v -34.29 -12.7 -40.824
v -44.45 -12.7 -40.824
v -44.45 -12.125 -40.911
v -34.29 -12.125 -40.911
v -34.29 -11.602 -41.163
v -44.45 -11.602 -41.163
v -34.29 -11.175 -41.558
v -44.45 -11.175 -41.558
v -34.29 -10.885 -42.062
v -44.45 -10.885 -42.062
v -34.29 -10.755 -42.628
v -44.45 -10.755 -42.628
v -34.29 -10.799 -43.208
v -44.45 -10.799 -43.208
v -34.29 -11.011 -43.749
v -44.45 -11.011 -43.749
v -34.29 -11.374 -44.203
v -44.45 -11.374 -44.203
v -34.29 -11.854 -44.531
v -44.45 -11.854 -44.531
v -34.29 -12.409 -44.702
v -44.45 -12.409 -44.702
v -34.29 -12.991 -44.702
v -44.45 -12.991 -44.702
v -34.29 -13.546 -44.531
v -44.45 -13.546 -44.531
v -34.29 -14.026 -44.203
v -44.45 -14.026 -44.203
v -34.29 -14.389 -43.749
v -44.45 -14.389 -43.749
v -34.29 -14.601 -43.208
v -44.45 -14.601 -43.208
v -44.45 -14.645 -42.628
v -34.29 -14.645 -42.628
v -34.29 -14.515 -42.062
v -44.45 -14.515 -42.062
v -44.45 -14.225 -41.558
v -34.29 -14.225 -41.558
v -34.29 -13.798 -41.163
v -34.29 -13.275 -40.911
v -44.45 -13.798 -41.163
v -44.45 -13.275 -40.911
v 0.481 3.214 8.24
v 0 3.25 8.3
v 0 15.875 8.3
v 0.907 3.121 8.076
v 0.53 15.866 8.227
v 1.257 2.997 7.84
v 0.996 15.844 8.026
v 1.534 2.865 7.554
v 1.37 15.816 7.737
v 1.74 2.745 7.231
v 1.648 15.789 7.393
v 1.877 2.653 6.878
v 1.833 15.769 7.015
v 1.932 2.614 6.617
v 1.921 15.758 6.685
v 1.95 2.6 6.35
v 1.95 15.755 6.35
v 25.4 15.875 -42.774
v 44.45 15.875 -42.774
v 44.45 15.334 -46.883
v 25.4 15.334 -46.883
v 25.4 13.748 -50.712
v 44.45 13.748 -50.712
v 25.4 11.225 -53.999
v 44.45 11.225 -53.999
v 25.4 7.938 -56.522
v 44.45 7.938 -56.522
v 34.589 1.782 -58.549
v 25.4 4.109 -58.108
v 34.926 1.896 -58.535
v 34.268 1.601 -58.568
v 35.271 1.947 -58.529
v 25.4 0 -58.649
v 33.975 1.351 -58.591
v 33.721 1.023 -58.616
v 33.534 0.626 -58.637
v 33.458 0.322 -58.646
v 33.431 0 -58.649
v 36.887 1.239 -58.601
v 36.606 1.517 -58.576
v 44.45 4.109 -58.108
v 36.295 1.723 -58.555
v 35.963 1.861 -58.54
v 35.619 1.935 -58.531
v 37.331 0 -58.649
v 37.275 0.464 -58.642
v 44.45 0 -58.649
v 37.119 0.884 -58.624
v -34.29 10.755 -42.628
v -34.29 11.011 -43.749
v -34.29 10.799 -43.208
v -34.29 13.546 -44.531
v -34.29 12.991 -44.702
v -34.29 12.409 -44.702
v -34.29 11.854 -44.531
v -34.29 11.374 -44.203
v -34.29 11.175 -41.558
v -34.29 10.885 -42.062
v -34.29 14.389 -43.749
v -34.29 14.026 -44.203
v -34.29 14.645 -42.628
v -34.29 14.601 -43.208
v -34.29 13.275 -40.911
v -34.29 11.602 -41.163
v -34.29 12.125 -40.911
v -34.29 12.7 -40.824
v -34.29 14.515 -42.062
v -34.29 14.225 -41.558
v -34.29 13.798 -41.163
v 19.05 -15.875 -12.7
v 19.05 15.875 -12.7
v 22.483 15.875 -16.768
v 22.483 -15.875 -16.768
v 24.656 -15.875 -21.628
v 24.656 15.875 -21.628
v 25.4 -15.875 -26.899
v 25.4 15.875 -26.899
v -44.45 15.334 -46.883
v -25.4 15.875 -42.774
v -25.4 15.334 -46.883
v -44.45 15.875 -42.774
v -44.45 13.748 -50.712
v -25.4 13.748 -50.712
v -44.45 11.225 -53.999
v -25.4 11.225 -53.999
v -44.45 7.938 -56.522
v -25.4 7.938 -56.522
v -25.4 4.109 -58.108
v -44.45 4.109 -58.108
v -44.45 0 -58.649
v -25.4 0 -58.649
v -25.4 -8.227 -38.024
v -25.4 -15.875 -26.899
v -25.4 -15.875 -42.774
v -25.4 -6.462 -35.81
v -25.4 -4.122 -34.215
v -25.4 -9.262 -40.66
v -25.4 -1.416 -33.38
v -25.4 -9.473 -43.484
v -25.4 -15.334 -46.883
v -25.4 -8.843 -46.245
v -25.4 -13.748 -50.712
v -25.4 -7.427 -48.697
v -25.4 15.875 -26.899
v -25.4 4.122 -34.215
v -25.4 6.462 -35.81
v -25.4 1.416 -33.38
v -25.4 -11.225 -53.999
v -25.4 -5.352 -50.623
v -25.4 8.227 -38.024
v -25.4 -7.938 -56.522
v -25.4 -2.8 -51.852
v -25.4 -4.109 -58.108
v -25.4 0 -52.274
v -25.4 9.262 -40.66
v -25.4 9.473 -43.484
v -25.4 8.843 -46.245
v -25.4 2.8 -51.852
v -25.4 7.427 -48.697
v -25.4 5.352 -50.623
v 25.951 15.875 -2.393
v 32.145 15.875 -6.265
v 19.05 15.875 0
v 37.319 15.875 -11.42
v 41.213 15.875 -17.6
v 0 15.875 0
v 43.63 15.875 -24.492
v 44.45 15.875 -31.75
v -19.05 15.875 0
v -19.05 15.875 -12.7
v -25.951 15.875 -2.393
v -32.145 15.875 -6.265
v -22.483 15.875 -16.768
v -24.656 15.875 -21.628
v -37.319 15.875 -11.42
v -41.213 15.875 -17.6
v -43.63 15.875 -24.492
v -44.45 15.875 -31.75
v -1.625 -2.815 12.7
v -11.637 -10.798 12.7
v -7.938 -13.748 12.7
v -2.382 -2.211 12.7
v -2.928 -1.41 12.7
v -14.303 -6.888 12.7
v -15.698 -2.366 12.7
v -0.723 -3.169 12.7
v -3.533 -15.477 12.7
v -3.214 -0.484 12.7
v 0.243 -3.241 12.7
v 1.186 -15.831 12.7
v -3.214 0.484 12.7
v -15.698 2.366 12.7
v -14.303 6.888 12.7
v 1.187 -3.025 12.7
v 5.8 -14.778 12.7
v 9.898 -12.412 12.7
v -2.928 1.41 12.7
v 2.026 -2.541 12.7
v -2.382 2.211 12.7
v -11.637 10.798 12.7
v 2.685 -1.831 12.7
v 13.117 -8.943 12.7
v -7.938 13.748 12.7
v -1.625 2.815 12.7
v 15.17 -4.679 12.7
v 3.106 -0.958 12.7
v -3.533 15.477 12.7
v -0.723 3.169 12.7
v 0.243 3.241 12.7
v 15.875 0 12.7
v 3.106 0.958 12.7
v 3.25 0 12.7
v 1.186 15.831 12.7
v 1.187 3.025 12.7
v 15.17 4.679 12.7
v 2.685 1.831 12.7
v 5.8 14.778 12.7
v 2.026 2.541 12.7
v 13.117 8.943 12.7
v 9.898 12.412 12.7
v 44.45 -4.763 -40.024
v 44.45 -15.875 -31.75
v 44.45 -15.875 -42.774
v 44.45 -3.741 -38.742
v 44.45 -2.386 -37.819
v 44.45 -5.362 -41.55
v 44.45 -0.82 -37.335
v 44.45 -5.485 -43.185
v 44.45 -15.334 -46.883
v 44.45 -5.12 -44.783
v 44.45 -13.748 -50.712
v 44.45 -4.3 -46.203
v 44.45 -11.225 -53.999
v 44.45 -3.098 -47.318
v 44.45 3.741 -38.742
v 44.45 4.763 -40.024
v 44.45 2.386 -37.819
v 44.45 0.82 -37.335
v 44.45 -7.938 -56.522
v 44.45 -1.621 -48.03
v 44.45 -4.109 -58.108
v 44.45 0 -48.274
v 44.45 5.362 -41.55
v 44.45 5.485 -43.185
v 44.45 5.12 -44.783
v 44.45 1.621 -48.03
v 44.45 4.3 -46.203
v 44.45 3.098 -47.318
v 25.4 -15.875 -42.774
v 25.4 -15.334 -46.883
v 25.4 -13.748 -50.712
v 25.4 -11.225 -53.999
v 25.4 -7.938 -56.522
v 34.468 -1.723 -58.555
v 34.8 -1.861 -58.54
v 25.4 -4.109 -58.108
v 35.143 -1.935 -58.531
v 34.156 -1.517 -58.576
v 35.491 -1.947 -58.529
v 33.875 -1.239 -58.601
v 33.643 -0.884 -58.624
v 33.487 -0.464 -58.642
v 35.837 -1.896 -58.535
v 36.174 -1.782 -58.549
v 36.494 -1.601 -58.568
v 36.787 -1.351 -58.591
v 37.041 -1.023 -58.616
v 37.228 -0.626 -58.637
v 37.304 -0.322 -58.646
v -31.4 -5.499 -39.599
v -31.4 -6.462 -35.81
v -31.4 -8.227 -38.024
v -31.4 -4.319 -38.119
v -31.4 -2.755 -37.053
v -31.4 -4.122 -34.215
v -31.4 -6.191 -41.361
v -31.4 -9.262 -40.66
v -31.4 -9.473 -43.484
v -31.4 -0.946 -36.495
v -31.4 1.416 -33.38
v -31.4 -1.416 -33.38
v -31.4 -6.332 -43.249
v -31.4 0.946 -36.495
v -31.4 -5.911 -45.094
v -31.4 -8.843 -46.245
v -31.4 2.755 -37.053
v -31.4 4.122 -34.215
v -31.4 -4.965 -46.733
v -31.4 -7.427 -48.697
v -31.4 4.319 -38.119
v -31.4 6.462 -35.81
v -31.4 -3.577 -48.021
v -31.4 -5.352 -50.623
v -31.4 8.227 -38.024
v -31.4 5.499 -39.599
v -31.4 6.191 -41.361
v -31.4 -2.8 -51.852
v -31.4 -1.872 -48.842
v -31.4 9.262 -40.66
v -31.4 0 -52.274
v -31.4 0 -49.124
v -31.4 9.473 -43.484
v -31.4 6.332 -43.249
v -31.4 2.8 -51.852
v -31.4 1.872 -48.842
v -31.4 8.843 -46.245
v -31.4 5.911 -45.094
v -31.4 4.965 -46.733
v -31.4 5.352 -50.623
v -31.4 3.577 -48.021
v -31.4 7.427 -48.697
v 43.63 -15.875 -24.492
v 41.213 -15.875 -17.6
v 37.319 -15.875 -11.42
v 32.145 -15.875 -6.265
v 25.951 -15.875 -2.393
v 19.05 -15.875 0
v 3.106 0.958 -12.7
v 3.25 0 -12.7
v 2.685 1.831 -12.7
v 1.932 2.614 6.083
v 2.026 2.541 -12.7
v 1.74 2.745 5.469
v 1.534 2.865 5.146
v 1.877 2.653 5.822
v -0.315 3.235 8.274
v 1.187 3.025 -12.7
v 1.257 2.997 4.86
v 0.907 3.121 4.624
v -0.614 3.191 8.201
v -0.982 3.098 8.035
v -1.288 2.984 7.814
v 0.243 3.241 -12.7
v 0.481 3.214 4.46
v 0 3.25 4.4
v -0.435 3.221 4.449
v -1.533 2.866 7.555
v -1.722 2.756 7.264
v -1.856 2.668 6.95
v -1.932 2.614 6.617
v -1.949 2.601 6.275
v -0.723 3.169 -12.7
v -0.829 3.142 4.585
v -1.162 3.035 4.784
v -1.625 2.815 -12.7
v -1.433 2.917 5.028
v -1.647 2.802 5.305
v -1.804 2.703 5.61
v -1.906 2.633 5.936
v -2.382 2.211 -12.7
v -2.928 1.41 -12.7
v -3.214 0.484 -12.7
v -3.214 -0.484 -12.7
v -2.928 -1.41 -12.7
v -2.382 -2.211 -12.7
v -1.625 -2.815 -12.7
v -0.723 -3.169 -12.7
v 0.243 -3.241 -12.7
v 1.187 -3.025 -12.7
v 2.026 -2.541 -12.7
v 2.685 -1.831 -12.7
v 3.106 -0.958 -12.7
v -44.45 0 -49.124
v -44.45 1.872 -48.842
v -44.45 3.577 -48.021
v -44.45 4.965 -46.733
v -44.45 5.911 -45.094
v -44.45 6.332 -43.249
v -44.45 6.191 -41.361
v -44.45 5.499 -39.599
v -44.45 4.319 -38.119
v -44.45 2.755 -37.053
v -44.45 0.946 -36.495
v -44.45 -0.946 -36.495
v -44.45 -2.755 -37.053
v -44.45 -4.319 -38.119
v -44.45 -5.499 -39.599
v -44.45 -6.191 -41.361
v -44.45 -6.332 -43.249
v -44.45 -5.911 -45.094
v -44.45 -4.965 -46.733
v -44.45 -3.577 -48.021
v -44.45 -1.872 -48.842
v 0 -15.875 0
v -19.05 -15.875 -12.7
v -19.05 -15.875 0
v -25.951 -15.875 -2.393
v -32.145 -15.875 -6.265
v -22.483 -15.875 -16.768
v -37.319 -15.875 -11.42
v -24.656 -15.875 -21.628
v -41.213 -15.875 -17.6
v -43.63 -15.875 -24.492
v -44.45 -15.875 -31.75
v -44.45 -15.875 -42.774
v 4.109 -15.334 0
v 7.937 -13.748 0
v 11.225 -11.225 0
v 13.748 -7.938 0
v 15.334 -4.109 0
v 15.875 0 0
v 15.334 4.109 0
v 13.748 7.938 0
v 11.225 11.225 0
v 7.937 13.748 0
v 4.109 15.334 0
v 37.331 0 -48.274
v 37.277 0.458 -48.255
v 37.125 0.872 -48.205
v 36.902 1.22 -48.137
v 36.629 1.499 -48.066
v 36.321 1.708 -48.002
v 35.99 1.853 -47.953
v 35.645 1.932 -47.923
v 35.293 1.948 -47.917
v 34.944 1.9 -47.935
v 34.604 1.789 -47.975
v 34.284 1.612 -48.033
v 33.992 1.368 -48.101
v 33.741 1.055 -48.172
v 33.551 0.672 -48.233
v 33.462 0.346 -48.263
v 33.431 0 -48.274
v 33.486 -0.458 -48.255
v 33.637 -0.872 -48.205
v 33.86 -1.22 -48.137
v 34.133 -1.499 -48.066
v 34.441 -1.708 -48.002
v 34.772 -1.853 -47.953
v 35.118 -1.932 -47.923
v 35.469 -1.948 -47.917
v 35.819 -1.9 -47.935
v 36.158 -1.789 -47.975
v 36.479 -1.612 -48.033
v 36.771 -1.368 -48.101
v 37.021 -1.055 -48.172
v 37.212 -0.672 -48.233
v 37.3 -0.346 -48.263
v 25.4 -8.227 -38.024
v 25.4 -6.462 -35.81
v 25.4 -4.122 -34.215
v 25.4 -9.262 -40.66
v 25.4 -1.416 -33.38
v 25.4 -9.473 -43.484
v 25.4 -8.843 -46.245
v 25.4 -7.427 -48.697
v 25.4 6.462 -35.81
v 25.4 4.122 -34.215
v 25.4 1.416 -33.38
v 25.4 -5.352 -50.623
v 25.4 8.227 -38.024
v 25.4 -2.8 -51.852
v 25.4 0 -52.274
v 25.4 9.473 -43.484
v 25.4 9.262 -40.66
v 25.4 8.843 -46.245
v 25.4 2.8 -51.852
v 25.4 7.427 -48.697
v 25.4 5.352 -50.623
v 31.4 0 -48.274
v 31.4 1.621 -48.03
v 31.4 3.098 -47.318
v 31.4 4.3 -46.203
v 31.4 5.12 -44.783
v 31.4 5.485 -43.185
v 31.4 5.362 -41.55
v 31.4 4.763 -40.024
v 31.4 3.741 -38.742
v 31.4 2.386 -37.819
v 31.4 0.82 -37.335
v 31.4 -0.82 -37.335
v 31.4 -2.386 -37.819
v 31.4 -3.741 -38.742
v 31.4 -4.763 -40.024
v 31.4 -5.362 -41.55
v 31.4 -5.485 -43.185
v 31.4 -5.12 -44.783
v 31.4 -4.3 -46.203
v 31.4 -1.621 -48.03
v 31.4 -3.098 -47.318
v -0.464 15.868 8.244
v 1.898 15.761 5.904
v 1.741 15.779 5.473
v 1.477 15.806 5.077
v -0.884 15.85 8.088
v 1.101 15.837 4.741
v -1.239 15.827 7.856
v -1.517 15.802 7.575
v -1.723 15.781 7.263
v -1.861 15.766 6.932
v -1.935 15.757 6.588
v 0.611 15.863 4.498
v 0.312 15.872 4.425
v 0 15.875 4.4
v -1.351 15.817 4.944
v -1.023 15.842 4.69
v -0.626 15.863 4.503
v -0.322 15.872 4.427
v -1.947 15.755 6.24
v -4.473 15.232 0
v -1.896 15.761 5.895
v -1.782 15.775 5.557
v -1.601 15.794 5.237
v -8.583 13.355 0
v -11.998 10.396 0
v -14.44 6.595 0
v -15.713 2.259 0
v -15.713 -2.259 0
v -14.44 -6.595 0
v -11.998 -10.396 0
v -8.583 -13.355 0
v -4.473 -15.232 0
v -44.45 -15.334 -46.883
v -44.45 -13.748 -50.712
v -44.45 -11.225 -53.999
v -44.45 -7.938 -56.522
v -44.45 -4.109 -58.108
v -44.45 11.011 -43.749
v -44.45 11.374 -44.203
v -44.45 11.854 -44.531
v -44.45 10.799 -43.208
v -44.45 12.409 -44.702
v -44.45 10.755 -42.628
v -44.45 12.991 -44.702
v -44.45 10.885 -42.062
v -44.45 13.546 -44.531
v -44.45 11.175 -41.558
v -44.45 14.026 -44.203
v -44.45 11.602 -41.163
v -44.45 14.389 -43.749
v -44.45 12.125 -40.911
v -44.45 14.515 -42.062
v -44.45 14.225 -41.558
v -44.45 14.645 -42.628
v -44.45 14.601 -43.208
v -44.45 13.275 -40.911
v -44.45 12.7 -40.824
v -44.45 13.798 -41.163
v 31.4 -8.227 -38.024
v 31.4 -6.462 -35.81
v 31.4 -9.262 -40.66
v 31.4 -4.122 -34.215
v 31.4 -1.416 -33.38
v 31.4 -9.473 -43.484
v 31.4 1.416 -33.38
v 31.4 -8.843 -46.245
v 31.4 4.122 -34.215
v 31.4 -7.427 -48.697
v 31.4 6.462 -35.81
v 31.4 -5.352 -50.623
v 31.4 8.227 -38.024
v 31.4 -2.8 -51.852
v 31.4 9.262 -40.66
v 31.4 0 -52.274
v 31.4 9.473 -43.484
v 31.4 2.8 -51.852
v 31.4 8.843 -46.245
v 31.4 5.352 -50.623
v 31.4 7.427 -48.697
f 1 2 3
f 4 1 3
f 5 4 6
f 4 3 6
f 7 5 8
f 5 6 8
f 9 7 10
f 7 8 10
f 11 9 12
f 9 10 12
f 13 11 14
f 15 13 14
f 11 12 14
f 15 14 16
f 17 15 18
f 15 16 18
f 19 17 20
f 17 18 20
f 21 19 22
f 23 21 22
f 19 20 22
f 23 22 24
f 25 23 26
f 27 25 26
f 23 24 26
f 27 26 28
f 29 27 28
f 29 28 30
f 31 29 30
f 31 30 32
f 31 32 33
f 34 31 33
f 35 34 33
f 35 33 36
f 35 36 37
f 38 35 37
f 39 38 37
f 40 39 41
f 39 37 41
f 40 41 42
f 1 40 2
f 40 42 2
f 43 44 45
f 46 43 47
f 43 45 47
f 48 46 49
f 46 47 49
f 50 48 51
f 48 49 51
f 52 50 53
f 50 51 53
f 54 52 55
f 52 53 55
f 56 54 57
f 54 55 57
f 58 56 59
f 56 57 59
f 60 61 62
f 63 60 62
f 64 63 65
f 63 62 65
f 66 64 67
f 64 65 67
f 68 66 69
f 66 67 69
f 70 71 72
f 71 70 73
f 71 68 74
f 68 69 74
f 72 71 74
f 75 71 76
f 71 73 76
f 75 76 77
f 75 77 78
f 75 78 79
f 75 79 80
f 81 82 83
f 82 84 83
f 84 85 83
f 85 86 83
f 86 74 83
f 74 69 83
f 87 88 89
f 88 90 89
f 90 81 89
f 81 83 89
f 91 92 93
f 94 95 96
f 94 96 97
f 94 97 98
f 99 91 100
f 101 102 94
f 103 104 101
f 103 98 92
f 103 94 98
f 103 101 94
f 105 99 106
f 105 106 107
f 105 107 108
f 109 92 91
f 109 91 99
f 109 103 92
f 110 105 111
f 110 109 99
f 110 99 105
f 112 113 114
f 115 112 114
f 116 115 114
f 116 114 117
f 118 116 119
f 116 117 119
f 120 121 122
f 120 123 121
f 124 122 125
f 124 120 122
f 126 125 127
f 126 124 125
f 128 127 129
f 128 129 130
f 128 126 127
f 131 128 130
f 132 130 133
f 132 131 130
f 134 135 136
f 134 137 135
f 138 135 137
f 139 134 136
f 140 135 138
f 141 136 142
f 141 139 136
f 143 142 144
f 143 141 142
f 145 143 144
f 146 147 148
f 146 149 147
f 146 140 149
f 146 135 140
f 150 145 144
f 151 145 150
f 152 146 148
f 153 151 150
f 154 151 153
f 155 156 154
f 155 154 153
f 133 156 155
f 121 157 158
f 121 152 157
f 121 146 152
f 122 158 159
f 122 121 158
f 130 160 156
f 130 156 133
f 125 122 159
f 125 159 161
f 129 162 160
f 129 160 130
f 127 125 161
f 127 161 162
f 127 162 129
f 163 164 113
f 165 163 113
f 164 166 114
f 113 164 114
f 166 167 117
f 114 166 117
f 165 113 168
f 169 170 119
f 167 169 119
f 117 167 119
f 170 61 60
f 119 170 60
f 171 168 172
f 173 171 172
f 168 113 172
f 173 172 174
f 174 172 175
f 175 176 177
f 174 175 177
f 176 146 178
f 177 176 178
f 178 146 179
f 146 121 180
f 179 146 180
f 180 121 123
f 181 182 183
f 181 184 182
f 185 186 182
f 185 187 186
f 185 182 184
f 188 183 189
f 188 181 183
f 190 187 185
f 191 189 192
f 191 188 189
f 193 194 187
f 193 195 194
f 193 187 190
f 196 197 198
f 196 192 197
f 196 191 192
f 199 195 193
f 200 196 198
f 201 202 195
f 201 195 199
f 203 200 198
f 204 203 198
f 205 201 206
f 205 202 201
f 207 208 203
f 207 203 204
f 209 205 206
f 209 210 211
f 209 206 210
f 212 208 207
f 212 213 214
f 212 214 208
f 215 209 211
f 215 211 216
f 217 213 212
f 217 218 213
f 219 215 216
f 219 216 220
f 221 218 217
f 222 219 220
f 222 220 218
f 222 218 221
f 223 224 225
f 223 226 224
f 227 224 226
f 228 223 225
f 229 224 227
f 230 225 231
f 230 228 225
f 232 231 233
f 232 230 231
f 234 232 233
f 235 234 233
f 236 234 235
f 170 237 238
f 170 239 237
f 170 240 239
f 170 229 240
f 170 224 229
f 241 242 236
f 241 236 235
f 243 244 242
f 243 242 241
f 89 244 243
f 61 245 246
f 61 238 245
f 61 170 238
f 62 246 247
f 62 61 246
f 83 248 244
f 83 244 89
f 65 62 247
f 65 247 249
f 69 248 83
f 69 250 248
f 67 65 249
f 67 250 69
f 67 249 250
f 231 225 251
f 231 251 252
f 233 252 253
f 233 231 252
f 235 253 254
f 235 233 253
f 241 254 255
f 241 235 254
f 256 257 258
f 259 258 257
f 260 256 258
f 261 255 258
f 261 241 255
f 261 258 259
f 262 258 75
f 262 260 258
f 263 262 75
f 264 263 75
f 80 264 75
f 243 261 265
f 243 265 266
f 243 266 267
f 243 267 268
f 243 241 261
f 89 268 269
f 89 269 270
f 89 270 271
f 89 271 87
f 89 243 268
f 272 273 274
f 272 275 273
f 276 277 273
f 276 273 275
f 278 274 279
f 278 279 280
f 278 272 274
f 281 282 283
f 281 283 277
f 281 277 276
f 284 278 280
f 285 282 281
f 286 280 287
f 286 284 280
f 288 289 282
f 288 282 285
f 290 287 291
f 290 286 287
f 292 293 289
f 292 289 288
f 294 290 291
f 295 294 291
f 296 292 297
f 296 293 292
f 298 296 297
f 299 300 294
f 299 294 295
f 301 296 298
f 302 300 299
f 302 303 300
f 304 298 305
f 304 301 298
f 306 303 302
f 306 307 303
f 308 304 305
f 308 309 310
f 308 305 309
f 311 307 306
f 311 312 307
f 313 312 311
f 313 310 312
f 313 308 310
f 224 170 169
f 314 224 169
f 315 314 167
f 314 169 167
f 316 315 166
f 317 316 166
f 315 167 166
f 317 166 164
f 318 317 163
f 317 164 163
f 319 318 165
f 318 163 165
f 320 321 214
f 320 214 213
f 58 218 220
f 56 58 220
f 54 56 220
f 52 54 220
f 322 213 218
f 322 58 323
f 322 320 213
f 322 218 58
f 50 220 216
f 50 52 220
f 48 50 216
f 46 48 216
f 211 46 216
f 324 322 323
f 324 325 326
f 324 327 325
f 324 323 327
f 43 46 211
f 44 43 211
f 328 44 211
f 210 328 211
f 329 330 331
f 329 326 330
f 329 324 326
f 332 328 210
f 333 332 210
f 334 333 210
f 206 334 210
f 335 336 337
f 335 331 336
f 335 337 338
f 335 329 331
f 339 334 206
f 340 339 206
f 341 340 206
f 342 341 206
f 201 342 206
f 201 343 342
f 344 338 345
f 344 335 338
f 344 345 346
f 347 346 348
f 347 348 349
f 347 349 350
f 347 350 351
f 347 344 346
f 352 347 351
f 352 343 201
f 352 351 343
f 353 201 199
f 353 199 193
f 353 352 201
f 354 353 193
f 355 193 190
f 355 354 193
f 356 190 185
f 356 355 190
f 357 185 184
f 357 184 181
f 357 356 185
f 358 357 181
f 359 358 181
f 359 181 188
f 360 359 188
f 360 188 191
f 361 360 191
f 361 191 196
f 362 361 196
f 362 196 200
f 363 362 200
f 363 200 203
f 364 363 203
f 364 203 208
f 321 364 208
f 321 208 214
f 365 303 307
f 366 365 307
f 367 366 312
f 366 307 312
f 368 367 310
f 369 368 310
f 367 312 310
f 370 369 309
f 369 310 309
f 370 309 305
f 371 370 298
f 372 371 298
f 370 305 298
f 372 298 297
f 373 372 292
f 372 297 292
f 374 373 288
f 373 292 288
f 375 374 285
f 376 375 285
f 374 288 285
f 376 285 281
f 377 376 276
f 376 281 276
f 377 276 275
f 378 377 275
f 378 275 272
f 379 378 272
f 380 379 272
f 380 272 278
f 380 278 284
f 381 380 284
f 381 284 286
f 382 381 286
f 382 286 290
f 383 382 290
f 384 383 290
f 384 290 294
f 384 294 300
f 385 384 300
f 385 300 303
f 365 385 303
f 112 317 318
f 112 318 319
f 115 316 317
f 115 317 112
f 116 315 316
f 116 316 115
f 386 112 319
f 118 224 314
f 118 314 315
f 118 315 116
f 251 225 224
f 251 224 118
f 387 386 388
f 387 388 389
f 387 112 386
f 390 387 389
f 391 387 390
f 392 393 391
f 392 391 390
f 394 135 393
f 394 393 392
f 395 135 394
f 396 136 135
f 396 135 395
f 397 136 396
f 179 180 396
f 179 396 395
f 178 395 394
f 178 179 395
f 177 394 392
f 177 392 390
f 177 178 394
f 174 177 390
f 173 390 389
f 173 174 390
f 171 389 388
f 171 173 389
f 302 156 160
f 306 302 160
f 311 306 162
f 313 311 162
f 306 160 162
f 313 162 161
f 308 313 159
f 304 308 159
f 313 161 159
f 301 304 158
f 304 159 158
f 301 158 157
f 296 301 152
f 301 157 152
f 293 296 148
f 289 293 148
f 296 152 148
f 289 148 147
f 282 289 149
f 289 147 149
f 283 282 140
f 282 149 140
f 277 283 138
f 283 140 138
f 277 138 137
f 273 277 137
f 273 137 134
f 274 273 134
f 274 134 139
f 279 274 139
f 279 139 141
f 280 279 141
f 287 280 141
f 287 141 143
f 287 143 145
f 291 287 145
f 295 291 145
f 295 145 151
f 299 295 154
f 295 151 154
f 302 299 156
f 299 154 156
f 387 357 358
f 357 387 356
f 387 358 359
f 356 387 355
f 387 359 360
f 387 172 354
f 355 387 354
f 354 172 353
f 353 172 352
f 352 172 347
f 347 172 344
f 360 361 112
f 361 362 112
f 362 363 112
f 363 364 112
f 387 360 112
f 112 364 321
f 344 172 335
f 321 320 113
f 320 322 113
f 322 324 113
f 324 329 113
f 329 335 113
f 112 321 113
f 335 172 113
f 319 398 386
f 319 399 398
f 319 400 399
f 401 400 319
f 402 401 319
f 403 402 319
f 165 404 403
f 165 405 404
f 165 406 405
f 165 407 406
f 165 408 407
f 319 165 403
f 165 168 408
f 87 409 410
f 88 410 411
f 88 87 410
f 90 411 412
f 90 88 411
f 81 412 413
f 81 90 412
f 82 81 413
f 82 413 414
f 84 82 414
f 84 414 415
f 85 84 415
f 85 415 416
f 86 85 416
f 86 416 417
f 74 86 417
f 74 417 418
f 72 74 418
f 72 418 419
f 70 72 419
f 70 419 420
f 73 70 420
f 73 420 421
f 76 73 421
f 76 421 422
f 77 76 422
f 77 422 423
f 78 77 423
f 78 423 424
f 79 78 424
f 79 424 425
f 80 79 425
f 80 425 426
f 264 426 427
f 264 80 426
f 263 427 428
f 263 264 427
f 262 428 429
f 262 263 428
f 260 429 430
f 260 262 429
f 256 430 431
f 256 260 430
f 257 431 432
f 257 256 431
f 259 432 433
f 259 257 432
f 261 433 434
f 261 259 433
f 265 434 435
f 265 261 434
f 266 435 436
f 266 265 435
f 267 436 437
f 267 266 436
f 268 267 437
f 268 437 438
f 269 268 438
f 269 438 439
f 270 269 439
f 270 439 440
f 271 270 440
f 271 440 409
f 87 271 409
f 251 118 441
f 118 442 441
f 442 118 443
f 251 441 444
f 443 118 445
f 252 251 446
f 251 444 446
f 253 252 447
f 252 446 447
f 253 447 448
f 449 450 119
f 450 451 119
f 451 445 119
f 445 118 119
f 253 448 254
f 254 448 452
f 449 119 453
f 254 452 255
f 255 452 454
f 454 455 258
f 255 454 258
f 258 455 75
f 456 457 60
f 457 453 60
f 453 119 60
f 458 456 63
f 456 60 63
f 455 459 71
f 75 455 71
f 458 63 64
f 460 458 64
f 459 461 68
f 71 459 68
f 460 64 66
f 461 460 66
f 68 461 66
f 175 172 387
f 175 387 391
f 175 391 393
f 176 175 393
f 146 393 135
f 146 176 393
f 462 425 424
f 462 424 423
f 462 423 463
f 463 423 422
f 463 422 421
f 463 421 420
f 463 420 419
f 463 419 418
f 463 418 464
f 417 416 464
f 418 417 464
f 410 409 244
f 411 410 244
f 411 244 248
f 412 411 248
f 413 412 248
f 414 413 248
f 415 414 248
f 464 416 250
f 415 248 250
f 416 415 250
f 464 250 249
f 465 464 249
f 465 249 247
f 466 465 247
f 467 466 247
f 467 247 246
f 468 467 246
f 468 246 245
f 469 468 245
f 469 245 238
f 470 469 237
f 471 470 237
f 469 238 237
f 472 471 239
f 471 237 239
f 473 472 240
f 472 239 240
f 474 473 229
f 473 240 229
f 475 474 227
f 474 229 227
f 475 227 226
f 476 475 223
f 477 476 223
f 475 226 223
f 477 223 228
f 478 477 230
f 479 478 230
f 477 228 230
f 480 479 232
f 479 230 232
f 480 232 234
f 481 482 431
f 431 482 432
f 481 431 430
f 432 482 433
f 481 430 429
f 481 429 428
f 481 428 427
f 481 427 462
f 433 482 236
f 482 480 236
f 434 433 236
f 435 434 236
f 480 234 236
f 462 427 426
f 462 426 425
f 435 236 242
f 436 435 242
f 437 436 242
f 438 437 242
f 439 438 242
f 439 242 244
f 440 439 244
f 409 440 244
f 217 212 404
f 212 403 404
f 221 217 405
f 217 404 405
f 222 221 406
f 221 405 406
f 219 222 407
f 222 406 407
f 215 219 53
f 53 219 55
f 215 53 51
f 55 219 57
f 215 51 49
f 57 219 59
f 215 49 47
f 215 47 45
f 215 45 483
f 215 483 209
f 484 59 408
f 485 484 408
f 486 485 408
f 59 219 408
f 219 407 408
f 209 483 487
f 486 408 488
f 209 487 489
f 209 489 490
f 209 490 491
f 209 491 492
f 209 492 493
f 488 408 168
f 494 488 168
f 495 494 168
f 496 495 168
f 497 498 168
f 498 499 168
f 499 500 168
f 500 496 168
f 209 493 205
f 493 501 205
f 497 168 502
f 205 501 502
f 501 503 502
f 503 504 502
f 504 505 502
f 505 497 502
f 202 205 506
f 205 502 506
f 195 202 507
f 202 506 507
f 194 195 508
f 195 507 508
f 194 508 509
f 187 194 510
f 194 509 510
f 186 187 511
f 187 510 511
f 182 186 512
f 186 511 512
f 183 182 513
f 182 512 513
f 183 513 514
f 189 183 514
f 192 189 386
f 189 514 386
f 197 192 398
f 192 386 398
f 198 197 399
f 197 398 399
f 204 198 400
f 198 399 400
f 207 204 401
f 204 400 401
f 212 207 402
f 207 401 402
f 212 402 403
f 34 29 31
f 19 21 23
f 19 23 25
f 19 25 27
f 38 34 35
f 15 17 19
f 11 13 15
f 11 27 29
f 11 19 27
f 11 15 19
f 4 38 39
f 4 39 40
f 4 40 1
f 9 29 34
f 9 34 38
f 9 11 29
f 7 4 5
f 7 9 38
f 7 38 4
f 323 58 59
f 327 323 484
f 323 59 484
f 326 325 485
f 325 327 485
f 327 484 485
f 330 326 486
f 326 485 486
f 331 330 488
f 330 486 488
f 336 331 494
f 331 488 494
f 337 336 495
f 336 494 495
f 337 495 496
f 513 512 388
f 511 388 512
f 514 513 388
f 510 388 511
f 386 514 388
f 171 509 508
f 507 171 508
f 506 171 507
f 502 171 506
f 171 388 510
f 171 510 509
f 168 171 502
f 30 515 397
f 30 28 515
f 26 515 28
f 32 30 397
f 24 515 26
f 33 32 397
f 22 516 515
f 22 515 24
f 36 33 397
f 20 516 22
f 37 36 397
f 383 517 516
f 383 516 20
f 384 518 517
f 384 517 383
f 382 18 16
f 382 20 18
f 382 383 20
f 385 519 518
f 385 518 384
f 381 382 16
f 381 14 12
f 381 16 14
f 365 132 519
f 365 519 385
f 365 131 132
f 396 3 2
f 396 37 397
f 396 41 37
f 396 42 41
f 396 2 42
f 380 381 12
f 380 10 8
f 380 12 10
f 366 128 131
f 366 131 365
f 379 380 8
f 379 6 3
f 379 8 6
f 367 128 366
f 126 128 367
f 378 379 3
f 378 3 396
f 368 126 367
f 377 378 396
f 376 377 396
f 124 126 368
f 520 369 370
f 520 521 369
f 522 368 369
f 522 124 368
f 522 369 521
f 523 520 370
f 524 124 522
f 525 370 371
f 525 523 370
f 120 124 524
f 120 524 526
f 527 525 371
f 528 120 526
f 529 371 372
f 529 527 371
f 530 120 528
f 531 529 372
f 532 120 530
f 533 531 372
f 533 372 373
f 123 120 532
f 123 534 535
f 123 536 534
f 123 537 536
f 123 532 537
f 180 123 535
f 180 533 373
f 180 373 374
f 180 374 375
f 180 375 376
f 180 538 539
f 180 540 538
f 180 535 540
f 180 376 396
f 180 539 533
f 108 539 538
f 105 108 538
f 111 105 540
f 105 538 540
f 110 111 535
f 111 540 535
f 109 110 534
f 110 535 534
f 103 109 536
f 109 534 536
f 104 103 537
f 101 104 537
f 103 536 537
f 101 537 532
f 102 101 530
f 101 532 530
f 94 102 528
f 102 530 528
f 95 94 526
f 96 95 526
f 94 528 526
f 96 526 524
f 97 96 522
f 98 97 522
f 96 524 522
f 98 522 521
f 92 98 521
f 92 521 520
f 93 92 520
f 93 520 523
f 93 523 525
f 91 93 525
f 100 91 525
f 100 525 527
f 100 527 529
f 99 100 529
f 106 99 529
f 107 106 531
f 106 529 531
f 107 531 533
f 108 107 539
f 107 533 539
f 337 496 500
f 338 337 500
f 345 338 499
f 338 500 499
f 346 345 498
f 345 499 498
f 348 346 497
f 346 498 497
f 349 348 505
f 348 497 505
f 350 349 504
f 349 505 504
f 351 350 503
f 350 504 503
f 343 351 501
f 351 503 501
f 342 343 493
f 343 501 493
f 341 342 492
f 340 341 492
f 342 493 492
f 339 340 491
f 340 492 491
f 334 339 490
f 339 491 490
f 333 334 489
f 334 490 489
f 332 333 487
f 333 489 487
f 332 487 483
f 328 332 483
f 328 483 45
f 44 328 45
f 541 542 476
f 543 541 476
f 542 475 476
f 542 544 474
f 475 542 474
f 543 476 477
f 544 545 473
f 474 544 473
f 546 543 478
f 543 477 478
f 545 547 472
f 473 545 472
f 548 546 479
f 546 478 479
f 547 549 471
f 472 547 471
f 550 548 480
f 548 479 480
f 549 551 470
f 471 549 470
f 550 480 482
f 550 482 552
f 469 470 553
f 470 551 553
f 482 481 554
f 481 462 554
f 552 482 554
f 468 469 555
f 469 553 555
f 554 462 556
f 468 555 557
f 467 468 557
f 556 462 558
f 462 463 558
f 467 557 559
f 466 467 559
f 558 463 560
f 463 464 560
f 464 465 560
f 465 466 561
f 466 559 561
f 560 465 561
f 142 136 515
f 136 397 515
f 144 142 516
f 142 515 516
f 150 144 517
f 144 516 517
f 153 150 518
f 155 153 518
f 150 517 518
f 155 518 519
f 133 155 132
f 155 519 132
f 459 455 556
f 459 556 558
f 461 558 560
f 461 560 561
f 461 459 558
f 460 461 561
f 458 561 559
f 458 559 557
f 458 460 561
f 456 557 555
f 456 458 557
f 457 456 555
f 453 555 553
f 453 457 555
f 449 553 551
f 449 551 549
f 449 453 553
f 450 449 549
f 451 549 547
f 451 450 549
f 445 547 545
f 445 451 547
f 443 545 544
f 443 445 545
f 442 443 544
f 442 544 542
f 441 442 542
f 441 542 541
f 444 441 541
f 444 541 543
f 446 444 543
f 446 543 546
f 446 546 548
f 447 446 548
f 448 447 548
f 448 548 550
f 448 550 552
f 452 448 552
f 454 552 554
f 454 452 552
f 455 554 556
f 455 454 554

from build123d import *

# Parameters (mm, degrees)
SKETCH1_R               = 15.875
SKETCH1_R_2             = 3.25
BOSS_EXTRUDE1_DEPTH     = 12.7
BOSS_EXTRUDE2_START     = -12.7
SKETCH1_3_W             = 38.1
SKETCH1_3_H             = 31.75
SKETCH1_3_R             = 3.25
BOSS_EXTRUDE2_DEPTH     = 12.7
CUT_EXTRUDE1_REACH      = 41.144
CUT_EXTRUDE1_END_RADIUS = 3.25
BOSS_EXTRUDE3_DEPTH     = 31.75
FILLET1_R               = 15.875
SKETCH8_R               = 6.35
CUT_EXTRUDE3_DEPTH      = 76.282979766
SKETCH8_3_R             = 9.5
SKETCH8_3_R_2           = 6.35
CUT_EXTRUDE4_DEPTH      = 6
SKETCH9_R               = 6.35
SKETCH9_R_2             = 5.5
BOSS_EXTRUDE4_DEPTH     = 13.05
SKETCH10_R              = 1.95
CUT_EXTRUDE5_DEPTH      = 10.16
CUT_EXTRUDE6_REACH      = 102.653
CUT_EXTRUDE6_END_RADIUS = 5.5


with BuildPart() as part:
    # Sketch1 → Boss-Extrude1 (new body)
    with BuildSketch(Plane.XY):
        Circle(SKETCH1_R)
        Circle(SKETCH1_R_2, mode=Mode.SUBTRACT)
    extrude(amount=BOSS_EXTRUDE1_DEPTH)

    # Sketch1<3> → Boss-Extrude2 (add)
    with BuildSketch(Plane.XY.offset(BOSS_EXTRUDE2_START)):
        Rectangle(SKETCH1_3_W, SKETCH1_3_H)
        Circle(SKETCH1_3_R, mode=Mode.SUBTRACT)
    extrude(amount=BOSS_EXTRUDE2_DEPTH)

    # Cut-Extrude1: up to this cylinder (the profile starts outside it)
    cut_extrude1_end = Plane(origin=(0, 0, 6.35), z_dir=(0, 0, -1)) * Cylinder(CUT_EXTRUDE1_END_RADIUS, 89.788, mode=Mode.PRIVATE)
    # Sketch4 → Cut-Extrude1 (cut, up to the surface)
    with BuildSketch(Plane(origin=(0, 15.875, 0), x_dir=(1, 0, 0), z_dir=(0, 1, 0)), mode=Mode.PRIVATE) as cut_extrude1_sk1:
        with BuildLine():
            ThreePointArc((1.95, -6.35), (1.378858223, -4.971141777), (0, -4.4))
            Line((0, -4.4), (0, -8.3))
            ThreePointArc((0, -8.3), (1.378858223, -7.728858223), (1.95, -6.35))
        make_face()
    cut_extrude1_tool1 = extrude(cut_extrude1_sk1.sketch, amount=-CUT_EXTRUDE1_REACH, mode=Mode.PRIVATE) - cut_extrude1_end
    add(cut_extrude1_tool1.solids().sort_by_distance((0.827606, 15.875, 6.35))[0], mode=Mode.SUBTRACT)
    # Sketch4 → Cut-Extrude1 (cut, up to the surface)
    with BuildSketch(Plane(origin=(0, 15.875, 0), x_dir=(1, 0, 0), z_dir=(0, 1, 0)), mode=Mode.PRIVATE) as cut_extrude1_sk2:
        with BuildLine():
            Line((0, -8.3), (0, -4.4))
            ThreePointArc((0, -4.4), (-1.95, -6.35), (0, -8.3))
        make_face()
    cut_extrude1_tool2 = extrude(cut_extrude1_sk2.sketch, amount=-CUT_EXTRUDE1_REACH, mode=Mode.PRIVATE) - cut_extrude1_end
    add(cut_extrude1_tool2.solids().sort_by_distance((-0.827606, 15.875, 6.35))[0], mode=Mode.SUBTRACT)
    # Sketch4 → Cut-Extrude1 (cut, up to the surface)
    with BuildSketch(Plane(origin=(0, 15.875, 0), x_dir=(1, 0, 0), z_dir=(0, 1, 0)), mode=Mode.PRIVATE) as cut_extrude1_sk3:
        with BuildLine():
            ThreePointArc((1.95, -6.35), (1.378858223, -4.971141777), (0, -4.4))
            Line((0, -4.4), (0, -8.3))
            ThreePointArc((0, -8.3), (1.378858223, -7.728858223), (1.95, -6.35))
        make_face()
    cut_extrude1_tool3 = extrude(cut_extrude1_sk3.sketch, amount=-CUT_EXTRUDE1_REACH, mode=Mode.PRIVATE) - cut_extrude1_end
    add(cut_extrude1_tool3.solids().sort_by_distance((0.827606, 15.875, 6.35))[0], mode=Mode.SUBTRACT)
    # Sketch4 → Cut-Extrude1 (cut, up to the surface)
    with BuildSketch(Plane(origin=(0, 15.875, 0), x_dir=(1, 0, 0), z_dir=(0, 1, 0)), mode=Mode.PRIVATE) as cut_extrude1_sk4:
        with BuildLine():
            Line((0, -8.3), (0, -4.4))
            ThreePointArc((0, -4.4), (-1.95, -6.35), (0, -8.3))
        make_face()
    cut_extrude1_tool4 = extrude(cut_extrude1_sk4.sketch, amount=-CUT_EXTRUDE1_REACH, mode=Mode.PRIVATE) - cut_extrude1_end
    add(cut_extrude1_tool4.solids().sort_by_distance((-0.827606, 15.875, 6.35))[0], mode=Mode.SUBTRACT)

    # Sketch7 → Boss-Extrude3 (add)
    with BuildSketch(Plane(origin=(0, 15.875, 0), x_dir=(1, 0, 0), z_dir=(0, 1, 0))):
        with BuildLine():
            ThreePointArc((-19.05, 12.7), (-23.740191201, 19.121901724), (-25.4, 26.899031657))
            Line((-25.4, 26.899031657), (-25.4, 58.649031657))
            Line((-25.4, 58.649031657), (-44.45, 58.649031657))
            Line((-44.45, 58.649031657), (-44.45, 31.75))
            ThreePointArc((-44.45, 31.75), (-37.318649317, 11.420080546), (-19.05, 0))
            Line((-19.05, 0), (-19.05, 12.7))
        make_face()
    extrude(amount=-BOSS_EXTRUDE3_DEPTH)

    # Fillet1
    fillet1_edges = [part.edges().sort_by_distance(p)[0] for p in [
        (-34.925, -15.875, -58.649031657),
        (-34.925, 15.875, -58.649031657),
    ]]
    fillet(fillet1_edges, radius=FILLET1_R - 0.0001)  # a hair under: the kernel refuses the full size

    # Sketch8 → Cut-Extrude3 (cut, through all)
    with BuildSketch(Plane(origin=(-25.4, 0, 0), x_dir=(0, 0, -1), z_dir=(1, 0, 0))):
        with Locations((42.774031657, 0)):
            Circle(SKETCH8_R)
    extrude(amount=-CUT_EXTRUDE3_DEPTH, mode=Mode.SUBTRACT)

    # Sketch8<3> → Cut-Extrude4 (cut)
    with BuildSketch(Plane(origin=(-25.4, 0, 0), x_dir=(0, 0, -1), z_dir=(1, 0, 0))):
        with Locations((42.774031657, 0)):
            Circle(SKETCH8_3_R)
        with Locations((42.774031657, 0)):
            Circle(SKETCH8_3_R_2, mode=Mode.SUBTRACT)
    extrude(amount=-CUT_EXTRUDE4_DEPTH, mode=Mode.SUBTRACT)

    # Mirror1: part across plane


with BuildPart() as part_1:
    add(part.part)
    add(part.part.mirror(Plane(origin=(0, 0, 0), x_dir=(0, 0, 1), z_dir=(1, 0, 0))))

    # Sketch9 → Boss-Extrude4 (add)
    with BuildSketch(Plane(origin=(44.45, 0, 0), x_dir=(0, 0, -1), z_dir=(1, 0, 0))):
        with Locations((42.774031657, 0)):
            Circle(SKETCH9_R)
        with Locations((42.774031657, 0)):
            Circle(SKETCH9_R_2, mode=Mode.SUBTRACT)
    extrude(amount=-BOSS_EXTRUDE4_DEPTH)

    # Sketch10 → Cut-Extrude5 (cut)
    with BuildSketch(Plane.ZY.offset(44.45)):
        with Locations((-42.774031657, 12.7)):
            Circle(SKETCH10_R)
        with Locations((-42.774031657, -12.7)):
            Circle(SKETCH10_R)
    extrude(amount=-CUT_EXTRUDE5_DEPTH, mode=Mode.SUBTRACT)

    # Cut-Extrude6: up to this cylinder (the profile starts outside it)
    cut_extrude6_end = Plane(origin=(35.381138, 0, -42.774031657), z_dir=(1, 0, 0)) * Cylinder(CUT_EXTRUDE6_END_RADIUS, 217.306, mode=Mode.PRIVATE)
    # Sketch11 → Cut-Extrude6 (cut, up to the surface)
    with BuildSketch(Plane.XY.offset(-76.2), mode=Mode.PRIVATE) as cut_extrude6_sk1:
        with BuildLine():
            ThreePointArc((33.431138122, 0), (35.381138122, -1.95), (37.331138122, 0))
            Line((37.331138122, 0), (33.431138122, 0))
        make_face()
    cut_extrude6_tool1 = extrude(cut_extrude6_sk1.sketch, amount=CUT_EXTRUDE6_REACH, mode=Mode.PRIVATE) - cut_extrude6_end
    add(cut_extrude6_tool1.solids().sort_by_distance((35.381138, -0.827606, -76.2))[0], mode=Mode.SUBTRACT)
    # Sketch11 → Cut-Extrude6 (cut, up to the surface)
    with BuildSketch(Plane.XY.offset(-76.2), mode=Mode.PRIVATE) as cut_extrude6_sk2:
        with BuildLine():
            Line((33.431138122, 0), (37.331138122, 0))
            ThreePointArc((37.331138122, 0), (35.381138122, 1.95), (33.431138122, 0))
        make_face()
    cut_extrude6_tool2 = extrude(cut_extrude6_sk2.sketch, amount=CUT_EXTRUDE6_REACH, mode=Mode.PRIVATE) - cut_extrude6_end
    add(cut_extrude6_tool2.solids().sort_by_distance((35.381138, 0.827606, -76.2))[0], mode=Mode.SUBTRACT)
    # Sketch11 → Cut-Extrude6 (cut, up to the surface)
    with BuildSketch(Plane.XY.offset(-76.2), mode=Mode.PRIVATE) as cut_extrude6_sk3:
        with BuildLine():
            ThreePointArc((33.431138122, 0), (35.381138122, -1.95), (37.331138122, 0))
            Line((37.331138122, 0), (33.431138122, 0))
        make_face()
    cut_extrude6_tool3 = extrude(cut_extrude6_sk3.sketch, amount=CUT_EXTRUDE6_REACH, mode=Mode.PRIVATE) - cut_extrude6_end
    add(cut_extrude6_tool3.solids().sort_by_distance((35.381138, -0.827606, -76.2))[0], mode=Mode.SUBTRACT)
    # Sketch11 → Cut-Extrude6 (cut, up to the surface)
    with BuildSketch(Plane.XY.offset(-76.2), mode=Mode.PRIVATE) as cut_extrude6_sk4:
        with BuildLine():
            Line((33.431138122, 0), (37.331138122, 0))
            ThreePointArc((37.331138122, 0), (35.381138122, 1.95), (33.431138122, 0))
        make_face()
    cut_extrude6_tool4 = extrude(cut_extrude6_sk4.sketch, amount=CUT_EXTRUDE6_REACH, mode=Mode.PRIVATE) - cut_extrude6_end
    add(cut_extrude6_tool4.solids().sort_by_distance((35.381138, 0.827606, -76.2))[0], mode=Mode.SUBTRACT)


solid = part_1.part
